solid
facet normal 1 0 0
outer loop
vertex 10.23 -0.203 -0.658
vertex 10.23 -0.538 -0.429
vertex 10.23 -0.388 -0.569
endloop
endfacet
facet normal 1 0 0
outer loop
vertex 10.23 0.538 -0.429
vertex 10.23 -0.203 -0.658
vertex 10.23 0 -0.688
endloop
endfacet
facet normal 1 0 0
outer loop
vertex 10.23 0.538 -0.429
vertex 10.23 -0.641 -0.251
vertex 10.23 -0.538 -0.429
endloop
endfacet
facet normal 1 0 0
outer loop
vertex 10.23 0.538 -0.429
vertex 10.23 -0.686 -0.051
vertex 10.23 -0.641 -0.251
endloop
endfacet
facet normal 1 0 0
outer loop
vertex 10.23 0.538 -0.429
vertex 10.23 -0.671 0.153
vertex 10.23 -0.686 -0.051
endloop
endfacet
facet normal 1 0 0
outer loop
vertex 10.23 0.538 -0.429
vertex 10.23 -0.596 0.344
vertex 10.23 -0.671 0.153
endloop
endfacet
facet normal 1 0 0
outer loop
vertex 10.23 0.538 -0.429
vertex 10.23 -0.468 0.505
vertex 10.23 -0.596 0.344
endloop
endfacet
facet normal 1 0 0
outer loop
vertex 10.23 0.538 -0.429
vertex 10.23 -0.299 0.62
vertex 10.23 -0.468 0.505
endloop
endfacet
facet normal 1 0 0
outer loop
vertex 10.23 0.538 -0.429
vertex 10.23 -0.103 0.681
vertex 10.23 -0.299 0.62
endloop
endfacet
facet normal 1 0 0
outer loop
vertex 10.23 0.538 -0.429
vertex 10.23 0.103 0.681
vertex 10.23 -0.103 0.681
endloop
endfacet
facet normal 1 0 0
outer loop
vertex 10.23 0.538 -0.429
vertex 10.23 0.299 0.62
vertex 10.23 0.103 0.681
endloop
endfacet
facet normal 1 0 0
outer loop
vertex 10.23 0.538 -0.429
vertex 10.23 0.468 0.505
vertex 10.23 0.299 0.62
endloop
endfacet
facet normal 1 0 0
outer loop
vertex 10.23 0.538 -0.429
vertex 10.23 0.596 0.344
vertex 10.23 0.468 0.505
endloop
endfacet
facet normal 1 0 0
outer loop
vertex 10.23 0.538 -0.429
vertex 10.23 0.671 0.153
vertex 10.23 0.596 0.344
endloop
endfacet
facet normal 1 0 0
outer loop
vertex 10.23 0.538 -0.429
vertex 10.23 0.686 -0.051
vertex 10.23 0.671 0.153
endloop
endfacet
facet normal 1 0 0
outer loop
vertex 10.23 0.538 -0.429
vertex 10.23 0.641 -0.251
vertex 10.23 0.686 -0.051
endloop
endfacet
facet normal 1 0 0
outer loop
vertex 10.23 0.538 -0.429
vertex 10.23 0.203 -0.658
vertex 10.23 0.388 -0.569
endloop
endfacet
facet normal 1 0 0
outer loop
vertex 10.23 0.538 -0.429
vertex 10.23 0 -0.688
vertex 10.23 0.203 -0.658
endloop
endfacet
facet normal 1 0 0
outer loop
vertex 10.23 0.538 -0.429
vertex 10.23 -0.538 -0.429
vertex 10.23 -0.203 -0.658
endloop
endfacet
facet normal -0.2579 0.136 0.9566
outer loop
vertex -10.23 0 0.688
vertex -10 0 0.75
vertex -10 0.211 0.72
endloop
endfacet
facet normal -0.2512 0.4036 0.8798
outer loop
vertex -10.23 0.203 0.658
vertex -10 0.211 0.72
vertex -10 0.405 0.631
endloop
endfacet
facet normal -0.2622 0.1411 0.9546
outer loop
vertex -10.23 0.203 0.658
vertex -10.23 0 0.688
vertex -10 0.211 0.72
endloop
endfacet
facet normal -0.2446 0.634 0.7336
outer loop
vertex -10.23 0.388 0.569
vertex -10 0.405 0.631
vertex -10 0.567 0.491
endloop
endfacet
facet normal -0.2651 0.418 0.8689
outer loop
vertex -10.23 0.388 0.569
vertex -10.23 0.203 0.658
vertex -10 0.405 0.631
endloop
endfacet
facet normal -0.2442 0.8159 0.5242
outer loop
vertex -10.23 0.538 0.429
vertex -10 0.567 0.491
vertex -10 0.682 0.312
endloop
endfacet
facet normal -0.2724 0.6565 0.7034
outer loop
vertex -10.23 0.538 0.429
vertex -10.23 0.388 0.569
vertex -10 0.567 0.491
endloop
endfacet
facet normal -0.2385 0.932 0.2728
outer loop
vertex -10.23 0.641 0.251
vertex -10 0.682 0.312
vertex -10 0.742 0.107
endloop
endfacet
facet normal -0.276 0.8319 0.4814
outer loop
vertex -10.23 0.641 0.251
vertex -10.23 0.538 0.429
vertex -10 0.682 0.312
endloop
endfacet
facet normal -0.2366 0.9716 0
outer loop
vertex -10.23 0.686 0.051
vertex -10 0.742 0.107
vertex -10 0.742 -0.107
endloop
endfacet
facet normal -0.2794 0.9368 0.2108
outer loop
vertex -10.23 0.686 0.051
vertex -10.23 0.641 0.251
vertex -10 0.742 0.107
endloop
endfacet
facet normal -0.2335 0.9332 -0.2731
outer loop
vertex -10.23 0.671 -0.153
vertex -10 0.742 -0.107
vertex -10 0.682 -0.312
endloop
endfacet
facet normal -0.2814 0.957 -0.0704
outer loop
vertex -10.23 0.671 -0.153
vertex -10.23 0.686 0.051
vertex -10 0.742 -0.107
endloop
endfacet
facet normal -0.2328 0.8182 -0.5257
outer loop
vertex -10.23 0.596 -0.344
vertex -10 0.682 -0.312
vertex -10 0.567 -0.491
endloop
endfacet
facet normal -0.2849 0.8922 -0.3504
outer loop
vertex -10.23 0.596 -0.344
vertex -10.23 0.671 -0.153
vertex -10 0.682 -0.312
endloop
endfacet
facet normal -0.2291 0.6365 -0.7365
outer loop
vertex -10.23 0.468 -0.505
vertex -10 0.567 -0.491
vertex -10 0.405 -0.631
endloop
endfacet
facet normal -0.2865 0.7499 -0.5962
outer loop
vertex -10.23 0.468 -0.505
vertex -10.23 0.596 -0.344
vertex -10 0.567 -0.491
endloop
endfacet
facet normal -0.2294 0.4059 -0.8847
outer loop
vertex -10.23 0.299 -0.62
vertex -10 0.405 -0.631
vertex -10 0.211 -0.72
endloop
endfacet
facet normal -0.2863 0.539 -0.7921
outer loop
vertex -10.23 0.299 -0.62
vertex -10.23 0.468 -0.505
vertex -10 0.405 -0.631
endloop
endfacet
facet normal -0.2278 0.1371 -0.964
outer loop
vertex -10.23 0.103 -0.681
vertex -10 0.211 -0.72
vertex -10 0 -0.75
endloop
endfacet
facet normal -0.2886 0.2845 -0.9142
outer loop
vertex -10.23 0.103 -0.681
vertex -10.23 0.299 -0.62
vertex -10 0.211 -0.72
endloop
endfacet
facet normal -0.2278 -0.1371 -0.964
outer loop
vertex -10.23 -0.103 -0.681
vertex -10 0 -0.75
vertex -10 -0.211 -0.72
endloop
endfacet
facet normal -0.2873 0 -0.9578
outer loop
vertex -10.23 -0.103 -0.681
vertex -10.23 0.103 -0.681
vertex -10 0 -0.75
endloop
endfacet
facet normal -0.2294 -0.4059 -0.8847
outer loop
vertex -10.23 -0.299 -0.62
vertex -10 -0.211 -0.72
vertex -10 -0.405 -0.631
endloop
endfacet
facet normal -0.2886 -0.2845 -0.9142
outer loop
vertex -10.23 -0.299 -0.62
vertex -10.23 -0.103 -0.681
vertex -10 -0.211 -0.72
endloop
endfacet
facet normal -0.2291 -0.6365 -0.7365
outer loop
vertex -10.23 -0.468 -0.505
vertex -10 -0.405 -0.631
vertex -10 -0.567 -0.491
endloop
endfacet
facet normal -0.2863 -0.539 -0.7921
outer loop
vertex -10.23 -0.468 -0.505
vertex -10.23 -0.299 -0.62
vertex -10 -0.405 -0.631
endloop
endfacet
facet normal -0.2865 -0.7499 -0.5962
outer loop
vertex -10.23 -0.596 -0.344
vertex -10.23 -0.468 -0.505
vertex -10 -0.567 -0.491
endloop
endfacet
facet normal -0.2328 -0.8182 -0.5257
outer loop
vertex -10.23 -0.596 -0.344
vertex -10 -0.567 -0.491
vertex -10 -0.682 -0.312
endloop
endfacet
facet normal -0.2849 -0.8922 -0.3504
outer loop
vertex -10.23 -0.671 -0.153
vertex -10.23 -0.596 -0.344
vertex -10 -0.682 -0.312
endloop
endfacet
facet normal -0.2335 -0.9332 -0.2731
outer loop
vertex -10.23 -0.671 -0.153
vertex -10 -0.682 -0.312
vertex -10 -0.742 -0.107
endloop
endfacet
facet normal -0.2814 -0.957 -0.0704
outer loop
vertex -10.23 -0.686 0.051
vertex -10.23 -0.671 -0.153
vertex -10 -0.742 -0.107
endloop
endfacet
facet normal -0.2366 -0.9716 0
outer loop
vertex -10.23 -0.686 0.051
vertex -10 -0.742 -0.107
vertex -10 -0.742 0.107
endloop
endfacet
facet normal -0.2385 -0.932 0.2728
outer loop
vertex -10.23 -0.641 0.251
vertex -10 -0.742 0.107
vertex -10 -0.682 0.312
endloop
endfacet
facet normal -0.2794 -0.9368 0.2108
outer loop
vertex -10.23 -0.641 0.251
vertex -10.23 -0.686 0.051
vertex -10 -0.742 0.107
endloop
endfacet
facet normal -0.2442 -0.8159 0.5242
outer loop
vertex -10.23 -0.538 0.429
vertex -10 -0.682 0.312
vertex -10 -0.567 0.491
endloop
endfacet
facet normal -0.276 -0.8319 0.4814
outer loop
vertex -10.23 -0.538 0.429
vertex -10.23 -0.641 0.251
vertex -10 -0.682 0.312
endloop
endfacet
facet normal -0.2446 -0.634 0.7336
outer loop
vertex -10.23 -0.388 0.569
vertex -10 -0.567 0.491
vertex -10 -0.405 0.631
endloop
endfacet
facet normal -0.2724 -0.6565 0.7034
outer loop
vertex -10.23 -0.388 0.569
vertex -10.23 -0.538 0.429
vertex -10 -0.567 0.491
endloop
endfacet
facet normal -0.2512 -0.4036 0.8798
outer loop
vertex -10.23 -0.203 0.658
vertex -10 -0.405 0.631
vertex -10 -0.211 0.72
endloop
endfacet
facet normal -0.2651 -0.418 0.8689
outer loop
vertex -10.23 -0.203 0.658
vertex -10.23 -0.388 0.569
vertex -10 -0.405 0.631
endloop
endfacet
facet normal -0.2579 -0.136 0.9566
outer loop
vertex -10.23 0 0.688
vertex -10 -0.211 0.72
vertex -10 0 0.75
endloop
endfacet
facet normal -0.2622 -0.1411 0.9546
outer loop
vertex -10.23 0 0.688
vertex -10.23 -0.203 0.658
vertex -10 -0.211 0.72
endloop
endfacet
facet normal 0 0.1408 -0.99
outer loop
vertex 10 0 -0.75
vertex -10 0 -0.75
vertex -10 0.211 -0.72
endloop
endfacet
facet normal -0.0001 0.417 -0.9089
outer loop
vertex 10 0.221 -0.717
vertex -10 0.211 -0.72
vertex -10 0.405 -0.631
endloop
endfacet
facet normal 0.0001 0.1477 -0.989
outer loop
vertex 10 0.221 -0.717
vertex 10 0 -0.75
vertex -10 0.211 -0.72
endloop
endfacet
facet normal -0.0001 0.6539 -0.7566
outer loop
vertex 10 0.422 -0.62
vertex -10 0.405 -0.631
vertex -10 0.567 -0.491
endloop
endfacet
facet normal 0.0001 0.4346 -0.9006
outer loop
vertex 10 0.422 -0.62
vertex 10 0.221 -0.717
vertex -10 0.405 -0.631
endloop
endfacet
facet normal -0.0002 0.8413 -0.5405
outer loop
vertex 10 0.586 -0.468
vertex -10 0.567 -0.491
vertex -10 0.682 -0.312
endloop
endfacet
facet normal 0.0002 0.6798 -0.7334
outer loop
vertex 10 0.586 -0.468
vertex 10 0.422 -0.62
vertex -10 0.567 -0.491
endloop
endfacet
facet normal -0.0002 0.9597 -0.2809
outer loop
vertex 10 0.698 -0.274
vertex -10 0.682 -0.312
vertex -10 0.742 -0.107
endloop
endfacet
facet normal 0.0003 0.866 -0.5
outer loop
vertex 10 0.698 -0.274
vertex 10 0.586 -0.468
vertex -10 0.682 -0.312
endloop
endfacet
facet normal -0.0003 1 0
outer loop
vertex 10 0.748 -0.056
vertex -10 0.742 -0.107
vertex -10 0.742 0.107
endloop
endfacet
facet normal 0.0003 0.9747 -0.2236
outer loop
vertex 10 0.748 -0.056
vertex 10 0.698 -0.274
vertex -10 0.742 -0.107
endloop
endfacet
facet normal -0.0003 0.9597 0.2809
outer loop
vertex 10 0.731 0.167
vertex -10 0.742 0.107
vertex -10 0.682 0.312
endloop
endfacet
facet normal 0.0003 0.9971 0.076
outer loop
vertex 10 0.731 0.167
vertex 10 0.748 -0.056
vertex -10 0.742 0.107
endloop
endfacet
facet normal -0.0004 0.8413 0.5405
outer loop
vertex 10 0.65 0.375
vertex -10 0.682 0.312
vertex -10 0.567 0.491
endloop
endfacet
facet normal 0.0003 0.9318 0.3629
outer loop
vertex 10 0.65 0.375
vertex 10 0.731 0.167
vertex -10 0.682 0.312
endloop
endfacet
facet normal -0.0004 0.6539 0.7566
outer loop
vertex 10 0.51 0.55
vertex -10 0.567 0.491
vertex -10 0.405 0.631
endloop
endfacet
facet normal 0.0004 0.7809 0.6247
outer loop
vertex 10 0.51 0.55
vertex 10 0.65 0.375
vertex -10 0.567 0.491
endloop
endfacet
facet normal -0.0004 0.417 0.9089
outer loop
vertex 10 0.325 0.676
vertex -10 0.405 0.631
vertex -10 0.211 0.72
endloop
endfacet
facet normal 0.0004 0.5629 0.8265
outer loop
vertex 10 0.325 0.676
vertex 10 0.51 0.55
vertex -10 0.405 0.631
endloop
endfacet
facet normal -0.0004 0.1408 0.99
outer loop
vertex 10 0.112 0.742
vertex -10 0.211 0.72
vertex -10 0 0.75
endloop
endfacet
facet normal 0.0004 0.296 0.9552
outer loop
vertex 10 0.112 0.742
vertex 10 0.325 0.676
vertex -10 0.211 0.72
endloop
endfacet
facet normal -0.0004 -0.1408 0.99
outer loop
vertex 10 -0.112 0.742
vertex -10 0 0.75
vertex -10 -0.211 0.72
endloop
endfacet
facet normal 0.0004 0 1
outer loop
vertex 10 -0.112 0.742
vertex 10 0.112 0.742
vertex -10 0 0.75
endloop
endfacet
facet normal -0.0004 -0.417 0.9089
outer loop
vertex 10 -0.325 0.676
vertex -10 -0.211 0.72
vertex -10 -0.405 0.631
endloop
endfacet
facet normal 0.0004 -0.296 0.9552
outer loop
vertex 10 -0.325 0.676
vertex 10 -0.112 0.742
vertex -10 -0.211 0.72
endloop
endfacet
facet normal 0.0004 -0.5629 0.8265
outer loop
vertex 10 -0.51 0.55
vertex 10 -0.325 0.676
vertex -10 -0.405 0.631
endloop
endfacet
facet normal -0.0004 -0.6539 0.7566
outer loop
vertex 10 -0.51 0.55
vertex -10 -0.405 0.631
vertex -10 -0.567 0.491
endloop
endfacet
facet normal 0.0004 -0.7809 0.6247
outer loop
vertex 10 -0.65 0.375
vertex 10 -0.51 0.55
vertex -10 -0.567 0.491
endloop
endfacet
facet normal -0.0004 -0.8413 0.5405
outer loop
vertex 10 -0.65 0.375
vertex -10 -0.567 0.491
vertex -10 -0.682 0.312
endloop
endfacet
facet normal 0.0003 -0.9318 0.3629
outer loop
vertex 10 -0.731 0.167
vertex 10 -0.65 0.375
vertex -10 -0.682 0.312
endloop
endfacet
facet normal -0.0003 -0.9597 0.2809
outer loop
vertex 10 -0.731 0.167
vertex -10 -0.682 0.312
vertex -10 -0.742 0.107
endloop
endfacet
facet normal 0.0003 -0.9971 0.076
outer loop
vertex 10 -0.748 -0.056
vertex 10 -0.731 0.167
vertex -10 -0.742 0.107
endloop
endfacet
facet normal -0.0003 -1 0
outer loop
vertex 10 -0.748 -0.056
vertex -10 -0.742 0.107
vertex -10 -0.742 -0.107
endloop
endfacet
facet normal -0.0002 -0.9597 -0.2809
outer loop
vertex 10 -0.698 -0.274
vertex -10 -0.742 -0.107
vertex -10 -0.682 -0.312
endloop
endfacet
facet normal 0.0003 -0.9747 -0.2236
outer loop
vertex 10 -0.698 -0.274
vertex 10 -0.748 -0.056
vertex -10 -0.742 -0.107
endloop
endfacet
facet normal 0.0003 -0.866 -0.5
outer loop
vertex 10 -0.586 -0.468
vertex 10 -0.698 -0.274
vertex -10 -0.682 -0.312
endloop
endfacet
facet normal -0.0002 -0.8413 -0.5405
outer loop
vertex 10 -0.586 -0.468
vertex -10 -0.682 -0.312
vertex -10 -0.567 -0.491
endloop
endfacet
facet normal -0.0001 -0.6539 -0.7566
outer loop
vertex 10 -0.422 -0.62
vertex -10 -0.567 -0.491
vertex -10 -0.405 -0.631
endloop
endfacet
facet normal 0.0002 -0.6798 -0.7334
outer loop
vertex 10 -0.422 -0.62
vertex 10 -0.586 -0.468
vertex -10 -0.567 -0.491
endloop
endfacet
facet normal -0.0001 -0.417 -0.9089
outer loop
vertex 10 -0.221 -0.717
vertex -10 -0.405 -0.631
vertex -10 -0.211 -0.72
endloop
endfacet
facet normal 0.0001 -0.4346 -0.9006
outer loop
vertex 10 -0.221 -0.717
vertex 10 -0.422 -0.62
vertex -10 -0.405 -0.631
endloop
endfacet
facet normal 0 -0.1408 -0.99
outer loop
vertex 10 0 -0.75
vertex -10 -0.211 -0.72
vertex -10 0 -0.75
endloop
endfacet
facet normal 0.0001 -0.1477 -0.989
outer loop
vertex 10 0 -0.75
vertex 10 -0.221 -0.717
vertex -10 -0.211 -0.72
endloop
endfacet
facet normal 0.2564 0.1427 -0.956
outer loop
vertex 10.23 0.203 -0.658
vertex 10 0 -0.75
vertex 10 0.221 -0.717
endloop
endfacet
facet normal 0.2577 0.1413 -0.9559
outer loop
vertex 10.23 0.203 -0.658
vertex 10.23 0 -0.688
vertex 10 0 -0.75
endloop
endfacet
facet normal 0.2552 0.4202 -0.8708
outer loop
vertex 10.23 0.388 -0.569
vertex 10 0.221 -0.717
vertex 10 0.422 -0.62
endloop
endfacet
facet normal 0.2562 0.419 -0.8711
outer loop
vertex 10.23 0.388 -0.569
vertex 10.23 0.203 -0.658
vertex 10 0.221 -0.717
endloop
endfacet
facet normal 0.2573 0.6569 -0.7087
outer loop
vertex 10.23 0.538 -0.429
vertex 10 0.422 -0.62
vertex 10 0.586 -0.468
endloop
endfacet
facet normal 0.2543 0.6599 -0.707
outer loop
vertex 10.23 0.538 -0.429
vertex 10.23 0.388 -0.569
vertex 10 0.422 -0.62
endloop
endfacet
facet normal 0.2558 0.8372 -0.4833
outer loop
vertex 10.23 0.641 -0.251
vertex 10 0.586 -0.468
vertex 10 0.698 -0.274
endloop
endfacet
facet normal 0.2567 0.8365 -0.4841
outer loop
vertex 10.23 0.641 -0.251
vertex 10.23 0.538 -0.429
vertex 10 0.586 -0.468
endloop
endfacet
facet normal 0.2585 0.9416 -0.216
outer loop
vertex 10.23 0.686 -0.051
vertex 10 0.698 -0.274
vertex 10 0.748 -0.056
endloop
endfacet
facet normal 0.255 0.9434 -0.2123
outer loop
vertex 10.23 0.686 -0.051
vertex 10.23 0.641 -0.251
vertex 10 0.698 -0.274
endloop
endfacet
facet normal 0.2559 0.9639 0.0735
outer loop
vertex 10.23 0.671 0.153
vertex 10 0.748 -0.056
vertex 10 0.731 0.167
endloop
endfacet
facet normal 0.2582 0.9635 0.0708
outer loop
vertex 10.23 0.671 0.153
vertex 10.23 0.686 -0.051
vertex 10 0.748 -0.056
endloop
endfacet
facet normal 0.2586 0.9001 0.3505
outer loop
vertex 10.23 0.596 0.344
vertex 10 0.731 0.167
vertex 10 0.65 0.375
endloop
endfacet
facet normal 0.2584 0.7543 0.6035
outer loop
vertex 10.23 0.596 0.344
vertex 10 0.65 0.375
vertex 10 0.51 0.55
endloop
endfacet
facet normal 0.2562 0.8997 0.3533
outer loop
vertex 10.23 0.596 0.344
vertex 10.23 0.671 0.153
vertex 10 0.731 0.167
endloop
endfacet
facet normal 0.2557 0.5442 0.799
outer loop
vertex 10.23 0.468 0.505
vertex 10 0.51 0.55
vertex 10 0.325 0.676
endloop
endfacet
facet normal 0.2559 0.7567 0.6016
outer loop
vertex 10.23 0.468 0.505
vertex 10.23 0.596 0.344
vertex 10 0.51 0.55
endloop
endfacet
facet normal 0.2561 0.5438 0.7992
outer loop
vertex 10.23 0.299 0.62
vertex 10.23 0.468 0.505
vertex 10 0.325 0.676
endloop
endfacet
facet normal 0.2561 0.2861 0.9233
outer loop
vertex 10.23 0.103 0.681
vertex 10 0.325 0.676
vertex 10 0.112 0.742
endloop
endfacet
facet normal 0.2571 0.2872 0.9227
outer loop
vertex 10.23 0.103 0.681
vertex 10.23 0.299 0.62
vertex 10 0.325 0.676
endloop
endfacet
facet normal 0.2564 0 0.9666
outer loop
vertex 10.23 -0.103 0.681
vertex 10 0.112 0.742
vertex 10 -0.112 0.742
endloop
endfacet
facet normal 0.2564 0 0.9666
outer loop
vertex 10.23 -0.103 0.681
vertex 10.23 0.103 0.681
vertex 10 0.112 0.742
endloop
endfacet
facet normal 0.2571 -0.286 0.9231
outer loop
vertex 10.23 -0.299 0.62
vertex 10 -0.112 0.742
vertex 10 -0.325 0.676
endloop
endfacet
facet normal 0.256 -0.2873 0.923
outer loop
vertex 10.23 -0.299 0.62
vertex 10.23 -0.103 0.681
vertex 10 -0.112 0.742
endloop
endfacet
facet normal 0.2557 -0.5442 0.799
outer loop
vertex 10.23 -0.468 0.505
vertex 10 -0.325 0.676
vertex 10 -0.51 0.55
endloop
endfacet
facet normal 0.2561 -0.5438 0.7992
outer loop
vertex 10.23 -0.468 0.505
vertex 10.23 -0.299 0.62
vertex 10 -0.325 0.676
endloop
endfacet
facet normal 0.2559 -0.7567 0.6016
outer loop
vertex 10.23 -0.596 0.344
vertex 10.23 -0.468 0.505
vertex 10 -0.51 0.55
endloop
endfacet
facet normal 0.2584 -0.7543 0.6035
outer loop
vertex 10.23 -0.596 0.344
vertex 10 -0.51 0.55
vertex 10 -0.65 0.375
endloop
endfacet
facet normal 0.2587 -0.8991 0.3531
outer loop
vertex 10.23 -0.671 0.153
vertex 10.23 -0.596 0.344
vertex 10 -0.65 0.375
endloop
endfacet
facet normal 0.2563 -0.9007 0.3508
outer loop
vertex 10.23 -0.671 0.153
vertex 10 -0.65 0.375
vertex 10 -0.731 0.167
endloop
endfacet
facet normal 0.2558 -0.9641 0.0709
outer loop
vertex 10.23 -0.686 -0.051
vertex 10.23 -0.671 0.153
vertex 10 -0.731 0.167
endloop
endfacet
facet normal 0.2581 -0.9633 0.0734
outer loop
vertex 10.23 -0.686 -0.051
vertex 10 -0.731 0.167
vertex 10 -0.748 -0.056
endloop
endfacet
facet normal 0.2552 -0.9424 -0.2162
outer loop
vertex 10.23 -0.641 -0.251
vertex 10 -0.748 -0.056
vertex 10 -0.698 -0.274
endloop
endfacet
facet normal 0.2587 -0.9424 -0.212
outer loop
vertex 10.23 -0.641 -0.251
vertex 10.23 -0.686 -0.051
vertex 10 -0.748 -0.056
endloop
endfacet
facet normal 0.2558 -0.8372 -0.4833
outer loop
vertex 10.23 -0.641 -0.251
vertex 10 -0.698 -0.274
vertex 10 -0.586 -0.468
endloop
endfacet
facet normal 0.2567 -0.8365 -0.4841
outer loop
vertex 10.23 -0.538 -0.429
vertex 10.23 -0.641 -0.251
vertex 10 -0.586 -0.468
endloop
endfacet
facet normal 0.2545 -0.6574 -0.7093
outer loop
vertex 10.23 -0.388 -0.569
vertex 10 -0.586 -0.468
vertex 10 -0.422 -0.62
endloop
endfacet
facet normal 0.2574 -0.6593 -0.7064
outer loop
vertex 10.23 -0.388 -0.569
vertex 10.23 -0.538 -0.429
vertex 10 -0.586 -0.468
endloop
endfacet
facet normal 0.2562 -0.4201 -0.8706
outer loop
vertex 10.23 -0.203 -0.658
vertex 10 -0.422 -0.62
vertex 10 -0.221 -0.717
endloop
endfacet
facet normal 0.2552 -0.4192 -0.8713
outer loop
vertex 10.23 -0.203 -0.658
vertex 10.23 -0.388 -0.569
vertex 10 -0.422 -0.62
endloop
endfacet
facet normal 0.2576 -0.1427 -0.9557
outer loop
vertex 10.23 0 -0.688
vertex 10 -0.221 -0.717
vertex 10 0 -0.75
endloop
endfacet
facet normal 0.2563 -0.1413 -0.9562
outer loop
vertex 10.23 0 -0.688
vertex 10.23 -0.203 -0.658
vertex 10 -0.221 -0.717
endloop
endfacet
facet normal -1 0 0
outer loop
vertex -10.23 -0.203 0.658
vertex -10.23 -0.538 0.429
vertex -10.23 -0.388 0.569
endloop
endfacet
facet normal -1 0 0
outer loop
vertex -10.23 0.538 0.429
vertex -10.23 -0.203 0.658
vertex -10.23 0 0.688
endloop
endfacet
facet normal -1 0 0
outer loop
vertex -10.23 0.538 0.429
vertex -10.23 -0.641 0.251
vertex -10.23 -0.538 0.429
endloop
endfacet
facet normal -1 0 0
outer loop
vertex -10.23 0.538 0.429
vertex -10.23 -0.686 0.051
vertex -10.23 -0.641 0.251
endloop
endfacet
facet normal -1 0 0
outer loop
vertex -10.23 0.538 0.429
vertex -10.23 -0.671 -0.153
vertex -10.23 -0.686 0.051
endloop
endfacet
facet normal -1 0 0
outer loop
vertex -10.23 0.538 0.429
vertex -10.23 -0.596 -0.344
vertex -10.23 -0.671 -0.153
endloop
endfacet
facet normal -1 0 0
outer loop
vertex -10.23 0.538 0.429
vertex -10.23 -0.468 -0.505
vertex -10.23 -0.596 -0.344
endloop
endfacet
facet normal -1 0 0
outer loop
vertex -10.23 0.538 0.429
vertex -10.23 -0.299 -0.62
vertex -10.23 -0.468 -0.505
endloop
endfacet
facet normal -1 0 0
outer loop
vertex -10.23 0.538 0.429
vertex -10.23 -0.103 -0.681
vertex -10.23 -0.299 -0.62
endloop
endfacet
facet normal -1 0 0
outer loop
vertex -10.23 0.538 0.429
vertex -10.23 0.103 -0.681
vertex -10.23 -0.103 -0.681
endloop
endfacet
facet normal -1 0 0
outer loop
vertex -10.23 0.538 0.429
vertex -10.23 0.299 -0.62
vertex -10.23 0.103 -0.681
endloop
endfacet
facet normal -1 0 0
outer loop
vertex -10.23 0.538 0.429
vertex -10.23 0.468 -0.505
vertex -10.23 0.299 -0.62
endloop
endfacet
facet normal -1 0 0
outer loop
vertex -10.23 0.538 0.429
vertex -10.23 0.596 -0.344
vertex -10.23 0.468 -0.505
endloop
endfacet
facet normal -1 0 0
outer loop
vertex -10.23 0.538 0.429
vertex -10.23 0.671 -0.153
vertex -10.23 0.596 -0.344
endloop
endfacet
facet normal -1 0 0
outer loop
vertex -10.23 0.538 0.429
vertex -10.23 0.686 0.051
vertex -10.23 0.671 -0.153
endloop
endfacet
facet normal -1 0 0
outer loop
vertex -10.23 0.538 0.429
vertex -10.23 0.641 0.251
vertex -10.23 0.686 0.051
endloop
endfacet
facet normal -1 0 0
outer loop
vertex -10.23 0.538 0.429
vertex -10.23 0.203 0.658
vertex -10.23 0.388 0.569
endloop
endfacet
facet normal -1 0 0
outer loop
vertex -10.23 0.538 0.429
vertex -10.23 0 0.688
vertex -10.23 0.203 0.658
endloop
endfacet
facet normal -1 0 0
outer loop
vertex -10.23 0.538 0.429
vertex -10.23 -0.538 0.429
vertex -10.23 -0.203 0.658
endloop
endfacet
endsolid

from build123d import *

# Parameters (mm, degrees)
SKETCH2_R           = 0.75
EXTRUDE1_DEPTH      = 10
EXTRUDE1_DEPTH_BACK = 10
SKETCH3_R           = 0.75
EXTRUDE2_DEPTH      = 0.23
EXTRUDE2_TAPER      = 15
SKETCH4_R           = 0.75
EXTRUDE3_DEPTH      = 0.23
EXTRUDE3_TAPER      = 15


with BuildPart() as part:
    # Sketch2 → Extrude1 (new body, two sides)
    with BuildSketch(Plane(origin=(0, 0, 0), x_dir=(0, 0, -1), z_dir=(1, 0, 0))) as extrude1_sk:
        Circle(SKETCH2_R)
    extrude(amount=EXTRUDE1_DEPTH)
    extrude(extrude1_sk.sketch, amount=-EXTRUDE1_DEPTH_BACK)

    # Sketch3 → Extrude2 (add)
    with BuildSketch(Plane(origin=(10, 0, 0), x_dir=(0, 0, -1), z_dir=(1, 0, 0))):
        Circle(SKETCH3_R)
    extrude(amount=EXTRUDE2_DEPTH, taper=EXTRUDE2_TAPER)

    # Sketch4 → Extrude3 (add)
    with BuildSketch(Plane.ZY.offset(10)):
        Circle(SKETCH4_R)
    extrude(amount=EXTRUDE3_DEPTH, taper=EXTRUDE3_TAPER)


solid = part.part
